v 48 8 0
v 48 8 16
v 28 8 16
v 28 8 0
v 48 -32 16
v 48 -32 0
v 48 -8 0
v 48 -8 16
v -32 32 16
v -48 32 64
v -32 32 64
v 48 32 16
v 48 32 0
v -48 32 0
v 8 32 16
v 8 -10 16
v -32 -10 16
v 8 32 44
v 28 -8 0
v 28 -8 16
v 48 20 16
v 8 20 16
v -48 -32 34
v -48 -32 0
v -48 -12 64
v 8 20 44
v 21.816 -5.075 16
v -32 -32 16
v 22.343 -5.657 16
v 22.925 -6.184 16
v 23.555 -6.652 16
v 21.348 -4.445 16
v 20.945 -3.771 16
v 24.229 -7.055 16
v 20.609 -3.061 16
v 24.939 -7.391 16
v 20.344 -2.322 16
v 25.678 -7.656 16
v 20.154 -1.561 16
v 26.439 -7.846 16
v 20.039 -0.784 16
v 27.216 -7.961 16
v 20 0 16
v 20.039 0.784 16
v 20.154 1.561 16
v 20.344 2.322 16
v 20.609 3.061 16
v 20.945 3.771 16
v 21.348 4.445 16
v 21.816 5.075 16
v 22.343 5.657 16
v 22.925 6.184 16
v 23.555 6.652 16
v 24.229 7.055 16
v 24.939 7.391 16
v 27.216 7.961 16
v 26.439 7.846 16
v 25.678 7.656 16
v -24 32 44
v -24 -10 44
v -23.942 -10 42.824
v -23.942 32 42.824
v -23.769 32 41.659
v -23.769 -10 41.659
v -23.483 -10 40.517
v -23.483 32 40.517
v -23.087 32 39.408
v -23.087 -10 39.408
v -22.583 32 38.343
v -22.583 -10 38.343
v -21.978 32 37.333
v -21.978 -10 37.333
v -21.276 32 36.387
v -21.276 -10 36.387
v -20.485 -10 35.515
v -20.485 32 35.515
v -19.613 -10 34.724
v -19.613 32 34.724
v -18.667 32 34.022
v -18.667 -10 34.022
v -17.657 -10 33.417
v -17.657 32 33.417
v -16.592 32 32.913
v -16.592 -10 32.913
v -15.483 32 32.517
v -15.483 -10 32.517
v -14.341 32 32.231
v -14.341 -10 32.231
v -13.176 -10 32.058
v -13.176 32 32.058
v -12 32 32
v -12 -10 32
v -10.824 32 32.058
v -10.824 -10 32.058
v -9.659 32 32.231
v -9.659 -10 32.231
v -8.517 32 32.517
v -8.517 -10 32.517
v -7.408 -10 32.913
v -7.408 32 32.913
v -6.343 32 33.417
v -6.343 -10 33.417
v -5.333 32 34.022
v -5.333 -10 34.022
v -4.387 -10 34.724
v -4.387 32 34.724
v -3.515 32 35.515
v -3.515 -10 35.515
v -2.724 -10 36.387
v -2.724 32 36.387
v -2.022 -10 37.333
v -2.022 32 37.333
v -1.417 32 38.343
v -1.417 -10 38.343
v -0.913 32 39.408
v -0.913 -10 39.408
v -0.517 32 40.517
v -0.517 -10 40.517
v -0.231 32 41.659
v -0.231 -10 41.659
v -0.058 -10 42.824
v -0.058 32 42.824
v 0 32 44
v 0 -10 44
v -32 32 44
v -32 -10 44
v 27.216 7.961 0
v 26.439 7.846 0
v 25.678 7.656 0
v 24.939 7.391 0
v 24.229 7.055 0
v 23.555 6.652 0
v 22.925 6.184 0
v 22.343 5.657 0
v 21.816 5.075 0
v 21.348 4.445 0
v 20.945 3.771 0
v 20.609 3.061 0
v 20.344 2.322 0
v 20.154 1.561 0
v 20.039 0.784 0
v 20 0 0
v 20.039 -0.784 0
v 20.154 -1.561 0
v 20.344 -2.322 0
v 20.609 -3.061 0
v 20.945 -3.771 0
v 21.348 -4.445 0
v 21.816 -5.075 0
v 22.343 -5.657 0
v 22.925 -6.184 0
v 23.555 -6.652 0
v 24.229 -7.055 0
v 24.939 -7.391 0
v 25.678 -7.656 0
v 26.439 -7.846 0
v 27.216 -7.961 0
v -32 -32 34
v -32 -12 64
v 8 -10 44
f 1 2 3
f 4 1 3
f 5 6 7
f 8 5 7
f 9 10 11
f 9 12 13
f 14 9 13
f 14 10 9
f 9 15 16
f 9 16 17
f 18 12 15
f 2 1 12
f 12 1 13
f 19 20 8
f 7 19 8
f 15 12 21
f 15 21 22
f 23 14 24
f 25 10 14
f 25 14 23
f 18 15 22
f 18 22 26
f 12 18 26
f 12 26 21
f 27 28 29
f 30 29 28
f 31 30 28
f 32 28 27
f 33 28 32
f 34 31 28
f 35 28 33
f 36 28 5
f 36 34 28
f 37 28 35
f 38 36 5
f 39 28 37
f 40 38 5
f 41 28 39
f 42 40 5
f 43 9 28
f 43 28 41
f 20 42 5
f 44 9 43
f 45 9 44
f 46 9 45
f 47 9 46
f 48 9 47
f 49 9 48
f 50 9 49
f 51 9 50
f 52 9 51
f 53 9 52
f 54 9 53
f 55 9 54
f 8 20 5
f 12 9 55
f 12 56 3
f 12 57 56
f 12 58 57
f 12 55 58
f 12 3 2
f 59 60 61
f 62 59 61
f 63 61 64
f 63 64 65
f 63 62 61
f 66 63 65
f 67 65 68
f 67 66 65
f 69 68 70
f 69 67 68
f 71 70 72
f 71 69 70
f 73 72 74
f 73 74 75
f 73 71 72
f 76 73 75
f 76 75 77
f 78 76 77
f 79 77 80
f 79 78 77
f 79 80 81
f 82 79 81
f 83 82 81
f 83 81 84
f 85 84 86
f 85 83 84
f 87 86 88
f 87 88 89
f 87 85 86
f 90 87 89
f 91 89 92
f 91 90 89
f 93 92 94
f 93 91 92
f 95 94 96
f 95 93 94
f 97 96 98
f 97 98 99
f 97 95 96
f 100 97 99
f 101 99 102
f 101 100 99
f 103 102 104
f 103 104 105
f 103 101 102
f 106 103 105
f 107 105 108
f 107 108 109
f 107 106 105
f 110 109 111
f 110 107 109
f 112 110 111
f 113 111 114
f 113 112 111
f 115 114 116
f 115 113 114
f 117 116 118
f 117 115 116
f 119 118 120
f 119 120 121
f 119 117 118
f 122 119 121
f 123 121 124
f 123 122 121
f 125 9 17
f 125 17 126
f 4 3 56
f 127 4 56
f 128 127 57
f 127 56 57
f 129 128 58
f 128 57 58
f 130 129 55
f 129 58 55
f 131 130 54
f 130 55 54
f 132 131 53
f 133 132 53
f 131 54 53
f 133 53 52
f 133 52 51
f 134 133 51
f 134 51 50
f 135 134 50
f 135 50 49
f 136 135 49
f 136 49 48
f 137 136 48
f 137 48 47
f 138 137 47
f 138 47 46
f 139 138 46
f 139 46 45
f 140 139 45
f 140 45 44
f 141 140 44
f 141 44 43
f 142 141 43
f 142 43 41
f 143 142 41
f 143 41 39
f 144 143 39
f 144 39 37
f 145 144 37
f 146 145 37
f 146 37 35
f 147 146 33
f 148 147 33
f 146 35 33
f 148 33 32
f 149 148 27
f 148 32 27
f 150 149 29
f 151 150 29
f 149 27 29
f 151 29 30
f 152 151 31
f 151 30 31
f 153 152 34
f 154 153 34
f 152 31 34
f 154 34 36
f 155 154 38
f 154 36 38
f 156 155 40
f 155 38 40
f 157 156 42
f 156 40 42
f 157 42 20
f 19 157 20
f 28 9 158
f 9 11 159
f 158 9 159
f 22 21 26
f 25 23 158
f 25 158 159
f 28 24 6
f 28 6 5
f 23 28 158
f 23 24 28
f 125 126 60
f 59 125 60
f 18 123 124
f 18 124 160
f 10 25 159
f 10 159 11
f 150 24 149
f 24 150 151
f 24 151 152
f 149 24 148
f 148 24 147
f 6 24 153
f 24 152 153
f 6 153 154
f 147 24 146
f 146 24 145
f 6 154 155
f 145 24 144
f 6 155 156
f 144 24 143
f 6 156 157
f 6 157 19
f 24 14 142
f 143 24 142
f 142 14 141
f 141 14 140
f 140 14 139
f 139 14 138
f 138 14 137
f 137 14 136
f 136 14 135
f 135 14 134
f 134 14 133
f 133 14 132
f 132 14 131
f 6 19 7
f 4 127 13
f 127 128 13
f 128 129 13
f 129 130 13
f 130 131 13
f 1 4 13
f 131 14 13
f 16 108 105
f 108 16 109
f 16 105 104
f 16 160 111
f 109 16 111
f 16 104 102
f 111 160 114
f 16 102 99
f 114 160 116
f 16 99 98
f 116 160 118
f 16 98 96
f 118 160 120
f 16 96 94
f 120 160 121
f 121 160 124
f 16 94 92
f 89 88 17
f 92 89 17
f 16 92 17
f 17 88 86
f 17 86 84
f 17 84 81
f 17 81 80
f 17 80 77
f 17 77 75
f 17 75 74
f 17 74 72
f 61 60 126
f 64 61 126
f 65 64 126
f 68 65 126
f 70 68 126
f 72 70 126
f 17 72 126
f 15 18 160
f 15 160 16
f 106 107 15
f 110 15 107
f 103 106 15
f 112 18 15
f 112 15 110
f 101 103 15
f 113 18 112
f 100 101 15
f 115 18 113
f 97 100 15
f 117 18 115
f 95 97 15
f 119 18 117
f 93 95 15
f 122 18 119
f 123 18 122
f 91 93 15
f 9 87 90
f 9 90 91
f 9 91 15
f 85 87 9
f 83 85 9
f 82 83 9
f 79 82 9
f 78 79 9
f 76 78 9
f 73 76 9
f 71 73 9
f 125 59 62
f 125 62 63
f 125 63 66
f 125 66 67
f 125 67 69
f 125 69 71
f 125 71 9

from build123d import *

# Parameters (mm, degrees)
F0_W     = 96
F0_H     = 64
F1_DEPTH = 16
F3_DEPTH = 16
F5_DEPTH = 42
F7_DEPTH = 12
F9_DEPTH = 25


with BuildPart() as f1:
    # F0 (on Top) → F1 (new body)
    with BuildSketch(Plane.XY):
        Rectangle(F0_W, F0_H)
    extrude(amount=F1_DEPTH)

    # F2 (on face) → F3 (join)
    with BuildSketch(Plane(origin=(-48, 0, 0), x_dir=(0, -1, 0), z_dir=(-1, 0, 0))):
        Polygon((-32, 64), (-32, 0), (32, 0), (32, 34), (12, 64), align=None)
    extrude(amount=-F3_DEPTH)

    # F8 (on face) → F9 (cut)
    with BuildSketch(Plane.XY.offset(16)):
        with BuildLine():
            Line((48, 8), (28, 8))
            ThreePointArc((28, 8), (20, 0), (28, -8))
            Line((28, -8), (48, -8))
            Line((48, -8), (48, 8))
        make_face()
    extrude(amount=-F9_DEPTH, mode=Mode.SUBTRACT)


with BuildPart() as f5:
    # F4 (on face) → F5 (new body)
    with BuildSketch(Plane(origin=(0, 32, 0), x_dir=(-1, 0, 0), z_dir=(0, 1, 0))):
        with BuildLine():
            Line((-8, 16), (32, 16))
            Line((32, 16), (32, 44))
            Line((32, 44), (24, 44))
            ThreePointArc((24, 44), (12, 32), (0, 44))
            Line((0, 44), (-8, 44))
            Line((-8, 44), (-8, 16))
        make_face()
    extrude(amount=-F5_DEPTH)


with BuildPart() as f7:
    # F6 (on face) → F7 (new body)
    with BuildSketch(Plane(origin=(0, 32, 0), x_dir=(-1, 0, 0), z_dir=(0, 1, 0))):
        Polygon((-48, 16), (-8, 16), (-8, 44), align=None)
    extrude(amount=-F7_DEPTH)


solid = Compound([f1.part, f5.part, f7.part])
